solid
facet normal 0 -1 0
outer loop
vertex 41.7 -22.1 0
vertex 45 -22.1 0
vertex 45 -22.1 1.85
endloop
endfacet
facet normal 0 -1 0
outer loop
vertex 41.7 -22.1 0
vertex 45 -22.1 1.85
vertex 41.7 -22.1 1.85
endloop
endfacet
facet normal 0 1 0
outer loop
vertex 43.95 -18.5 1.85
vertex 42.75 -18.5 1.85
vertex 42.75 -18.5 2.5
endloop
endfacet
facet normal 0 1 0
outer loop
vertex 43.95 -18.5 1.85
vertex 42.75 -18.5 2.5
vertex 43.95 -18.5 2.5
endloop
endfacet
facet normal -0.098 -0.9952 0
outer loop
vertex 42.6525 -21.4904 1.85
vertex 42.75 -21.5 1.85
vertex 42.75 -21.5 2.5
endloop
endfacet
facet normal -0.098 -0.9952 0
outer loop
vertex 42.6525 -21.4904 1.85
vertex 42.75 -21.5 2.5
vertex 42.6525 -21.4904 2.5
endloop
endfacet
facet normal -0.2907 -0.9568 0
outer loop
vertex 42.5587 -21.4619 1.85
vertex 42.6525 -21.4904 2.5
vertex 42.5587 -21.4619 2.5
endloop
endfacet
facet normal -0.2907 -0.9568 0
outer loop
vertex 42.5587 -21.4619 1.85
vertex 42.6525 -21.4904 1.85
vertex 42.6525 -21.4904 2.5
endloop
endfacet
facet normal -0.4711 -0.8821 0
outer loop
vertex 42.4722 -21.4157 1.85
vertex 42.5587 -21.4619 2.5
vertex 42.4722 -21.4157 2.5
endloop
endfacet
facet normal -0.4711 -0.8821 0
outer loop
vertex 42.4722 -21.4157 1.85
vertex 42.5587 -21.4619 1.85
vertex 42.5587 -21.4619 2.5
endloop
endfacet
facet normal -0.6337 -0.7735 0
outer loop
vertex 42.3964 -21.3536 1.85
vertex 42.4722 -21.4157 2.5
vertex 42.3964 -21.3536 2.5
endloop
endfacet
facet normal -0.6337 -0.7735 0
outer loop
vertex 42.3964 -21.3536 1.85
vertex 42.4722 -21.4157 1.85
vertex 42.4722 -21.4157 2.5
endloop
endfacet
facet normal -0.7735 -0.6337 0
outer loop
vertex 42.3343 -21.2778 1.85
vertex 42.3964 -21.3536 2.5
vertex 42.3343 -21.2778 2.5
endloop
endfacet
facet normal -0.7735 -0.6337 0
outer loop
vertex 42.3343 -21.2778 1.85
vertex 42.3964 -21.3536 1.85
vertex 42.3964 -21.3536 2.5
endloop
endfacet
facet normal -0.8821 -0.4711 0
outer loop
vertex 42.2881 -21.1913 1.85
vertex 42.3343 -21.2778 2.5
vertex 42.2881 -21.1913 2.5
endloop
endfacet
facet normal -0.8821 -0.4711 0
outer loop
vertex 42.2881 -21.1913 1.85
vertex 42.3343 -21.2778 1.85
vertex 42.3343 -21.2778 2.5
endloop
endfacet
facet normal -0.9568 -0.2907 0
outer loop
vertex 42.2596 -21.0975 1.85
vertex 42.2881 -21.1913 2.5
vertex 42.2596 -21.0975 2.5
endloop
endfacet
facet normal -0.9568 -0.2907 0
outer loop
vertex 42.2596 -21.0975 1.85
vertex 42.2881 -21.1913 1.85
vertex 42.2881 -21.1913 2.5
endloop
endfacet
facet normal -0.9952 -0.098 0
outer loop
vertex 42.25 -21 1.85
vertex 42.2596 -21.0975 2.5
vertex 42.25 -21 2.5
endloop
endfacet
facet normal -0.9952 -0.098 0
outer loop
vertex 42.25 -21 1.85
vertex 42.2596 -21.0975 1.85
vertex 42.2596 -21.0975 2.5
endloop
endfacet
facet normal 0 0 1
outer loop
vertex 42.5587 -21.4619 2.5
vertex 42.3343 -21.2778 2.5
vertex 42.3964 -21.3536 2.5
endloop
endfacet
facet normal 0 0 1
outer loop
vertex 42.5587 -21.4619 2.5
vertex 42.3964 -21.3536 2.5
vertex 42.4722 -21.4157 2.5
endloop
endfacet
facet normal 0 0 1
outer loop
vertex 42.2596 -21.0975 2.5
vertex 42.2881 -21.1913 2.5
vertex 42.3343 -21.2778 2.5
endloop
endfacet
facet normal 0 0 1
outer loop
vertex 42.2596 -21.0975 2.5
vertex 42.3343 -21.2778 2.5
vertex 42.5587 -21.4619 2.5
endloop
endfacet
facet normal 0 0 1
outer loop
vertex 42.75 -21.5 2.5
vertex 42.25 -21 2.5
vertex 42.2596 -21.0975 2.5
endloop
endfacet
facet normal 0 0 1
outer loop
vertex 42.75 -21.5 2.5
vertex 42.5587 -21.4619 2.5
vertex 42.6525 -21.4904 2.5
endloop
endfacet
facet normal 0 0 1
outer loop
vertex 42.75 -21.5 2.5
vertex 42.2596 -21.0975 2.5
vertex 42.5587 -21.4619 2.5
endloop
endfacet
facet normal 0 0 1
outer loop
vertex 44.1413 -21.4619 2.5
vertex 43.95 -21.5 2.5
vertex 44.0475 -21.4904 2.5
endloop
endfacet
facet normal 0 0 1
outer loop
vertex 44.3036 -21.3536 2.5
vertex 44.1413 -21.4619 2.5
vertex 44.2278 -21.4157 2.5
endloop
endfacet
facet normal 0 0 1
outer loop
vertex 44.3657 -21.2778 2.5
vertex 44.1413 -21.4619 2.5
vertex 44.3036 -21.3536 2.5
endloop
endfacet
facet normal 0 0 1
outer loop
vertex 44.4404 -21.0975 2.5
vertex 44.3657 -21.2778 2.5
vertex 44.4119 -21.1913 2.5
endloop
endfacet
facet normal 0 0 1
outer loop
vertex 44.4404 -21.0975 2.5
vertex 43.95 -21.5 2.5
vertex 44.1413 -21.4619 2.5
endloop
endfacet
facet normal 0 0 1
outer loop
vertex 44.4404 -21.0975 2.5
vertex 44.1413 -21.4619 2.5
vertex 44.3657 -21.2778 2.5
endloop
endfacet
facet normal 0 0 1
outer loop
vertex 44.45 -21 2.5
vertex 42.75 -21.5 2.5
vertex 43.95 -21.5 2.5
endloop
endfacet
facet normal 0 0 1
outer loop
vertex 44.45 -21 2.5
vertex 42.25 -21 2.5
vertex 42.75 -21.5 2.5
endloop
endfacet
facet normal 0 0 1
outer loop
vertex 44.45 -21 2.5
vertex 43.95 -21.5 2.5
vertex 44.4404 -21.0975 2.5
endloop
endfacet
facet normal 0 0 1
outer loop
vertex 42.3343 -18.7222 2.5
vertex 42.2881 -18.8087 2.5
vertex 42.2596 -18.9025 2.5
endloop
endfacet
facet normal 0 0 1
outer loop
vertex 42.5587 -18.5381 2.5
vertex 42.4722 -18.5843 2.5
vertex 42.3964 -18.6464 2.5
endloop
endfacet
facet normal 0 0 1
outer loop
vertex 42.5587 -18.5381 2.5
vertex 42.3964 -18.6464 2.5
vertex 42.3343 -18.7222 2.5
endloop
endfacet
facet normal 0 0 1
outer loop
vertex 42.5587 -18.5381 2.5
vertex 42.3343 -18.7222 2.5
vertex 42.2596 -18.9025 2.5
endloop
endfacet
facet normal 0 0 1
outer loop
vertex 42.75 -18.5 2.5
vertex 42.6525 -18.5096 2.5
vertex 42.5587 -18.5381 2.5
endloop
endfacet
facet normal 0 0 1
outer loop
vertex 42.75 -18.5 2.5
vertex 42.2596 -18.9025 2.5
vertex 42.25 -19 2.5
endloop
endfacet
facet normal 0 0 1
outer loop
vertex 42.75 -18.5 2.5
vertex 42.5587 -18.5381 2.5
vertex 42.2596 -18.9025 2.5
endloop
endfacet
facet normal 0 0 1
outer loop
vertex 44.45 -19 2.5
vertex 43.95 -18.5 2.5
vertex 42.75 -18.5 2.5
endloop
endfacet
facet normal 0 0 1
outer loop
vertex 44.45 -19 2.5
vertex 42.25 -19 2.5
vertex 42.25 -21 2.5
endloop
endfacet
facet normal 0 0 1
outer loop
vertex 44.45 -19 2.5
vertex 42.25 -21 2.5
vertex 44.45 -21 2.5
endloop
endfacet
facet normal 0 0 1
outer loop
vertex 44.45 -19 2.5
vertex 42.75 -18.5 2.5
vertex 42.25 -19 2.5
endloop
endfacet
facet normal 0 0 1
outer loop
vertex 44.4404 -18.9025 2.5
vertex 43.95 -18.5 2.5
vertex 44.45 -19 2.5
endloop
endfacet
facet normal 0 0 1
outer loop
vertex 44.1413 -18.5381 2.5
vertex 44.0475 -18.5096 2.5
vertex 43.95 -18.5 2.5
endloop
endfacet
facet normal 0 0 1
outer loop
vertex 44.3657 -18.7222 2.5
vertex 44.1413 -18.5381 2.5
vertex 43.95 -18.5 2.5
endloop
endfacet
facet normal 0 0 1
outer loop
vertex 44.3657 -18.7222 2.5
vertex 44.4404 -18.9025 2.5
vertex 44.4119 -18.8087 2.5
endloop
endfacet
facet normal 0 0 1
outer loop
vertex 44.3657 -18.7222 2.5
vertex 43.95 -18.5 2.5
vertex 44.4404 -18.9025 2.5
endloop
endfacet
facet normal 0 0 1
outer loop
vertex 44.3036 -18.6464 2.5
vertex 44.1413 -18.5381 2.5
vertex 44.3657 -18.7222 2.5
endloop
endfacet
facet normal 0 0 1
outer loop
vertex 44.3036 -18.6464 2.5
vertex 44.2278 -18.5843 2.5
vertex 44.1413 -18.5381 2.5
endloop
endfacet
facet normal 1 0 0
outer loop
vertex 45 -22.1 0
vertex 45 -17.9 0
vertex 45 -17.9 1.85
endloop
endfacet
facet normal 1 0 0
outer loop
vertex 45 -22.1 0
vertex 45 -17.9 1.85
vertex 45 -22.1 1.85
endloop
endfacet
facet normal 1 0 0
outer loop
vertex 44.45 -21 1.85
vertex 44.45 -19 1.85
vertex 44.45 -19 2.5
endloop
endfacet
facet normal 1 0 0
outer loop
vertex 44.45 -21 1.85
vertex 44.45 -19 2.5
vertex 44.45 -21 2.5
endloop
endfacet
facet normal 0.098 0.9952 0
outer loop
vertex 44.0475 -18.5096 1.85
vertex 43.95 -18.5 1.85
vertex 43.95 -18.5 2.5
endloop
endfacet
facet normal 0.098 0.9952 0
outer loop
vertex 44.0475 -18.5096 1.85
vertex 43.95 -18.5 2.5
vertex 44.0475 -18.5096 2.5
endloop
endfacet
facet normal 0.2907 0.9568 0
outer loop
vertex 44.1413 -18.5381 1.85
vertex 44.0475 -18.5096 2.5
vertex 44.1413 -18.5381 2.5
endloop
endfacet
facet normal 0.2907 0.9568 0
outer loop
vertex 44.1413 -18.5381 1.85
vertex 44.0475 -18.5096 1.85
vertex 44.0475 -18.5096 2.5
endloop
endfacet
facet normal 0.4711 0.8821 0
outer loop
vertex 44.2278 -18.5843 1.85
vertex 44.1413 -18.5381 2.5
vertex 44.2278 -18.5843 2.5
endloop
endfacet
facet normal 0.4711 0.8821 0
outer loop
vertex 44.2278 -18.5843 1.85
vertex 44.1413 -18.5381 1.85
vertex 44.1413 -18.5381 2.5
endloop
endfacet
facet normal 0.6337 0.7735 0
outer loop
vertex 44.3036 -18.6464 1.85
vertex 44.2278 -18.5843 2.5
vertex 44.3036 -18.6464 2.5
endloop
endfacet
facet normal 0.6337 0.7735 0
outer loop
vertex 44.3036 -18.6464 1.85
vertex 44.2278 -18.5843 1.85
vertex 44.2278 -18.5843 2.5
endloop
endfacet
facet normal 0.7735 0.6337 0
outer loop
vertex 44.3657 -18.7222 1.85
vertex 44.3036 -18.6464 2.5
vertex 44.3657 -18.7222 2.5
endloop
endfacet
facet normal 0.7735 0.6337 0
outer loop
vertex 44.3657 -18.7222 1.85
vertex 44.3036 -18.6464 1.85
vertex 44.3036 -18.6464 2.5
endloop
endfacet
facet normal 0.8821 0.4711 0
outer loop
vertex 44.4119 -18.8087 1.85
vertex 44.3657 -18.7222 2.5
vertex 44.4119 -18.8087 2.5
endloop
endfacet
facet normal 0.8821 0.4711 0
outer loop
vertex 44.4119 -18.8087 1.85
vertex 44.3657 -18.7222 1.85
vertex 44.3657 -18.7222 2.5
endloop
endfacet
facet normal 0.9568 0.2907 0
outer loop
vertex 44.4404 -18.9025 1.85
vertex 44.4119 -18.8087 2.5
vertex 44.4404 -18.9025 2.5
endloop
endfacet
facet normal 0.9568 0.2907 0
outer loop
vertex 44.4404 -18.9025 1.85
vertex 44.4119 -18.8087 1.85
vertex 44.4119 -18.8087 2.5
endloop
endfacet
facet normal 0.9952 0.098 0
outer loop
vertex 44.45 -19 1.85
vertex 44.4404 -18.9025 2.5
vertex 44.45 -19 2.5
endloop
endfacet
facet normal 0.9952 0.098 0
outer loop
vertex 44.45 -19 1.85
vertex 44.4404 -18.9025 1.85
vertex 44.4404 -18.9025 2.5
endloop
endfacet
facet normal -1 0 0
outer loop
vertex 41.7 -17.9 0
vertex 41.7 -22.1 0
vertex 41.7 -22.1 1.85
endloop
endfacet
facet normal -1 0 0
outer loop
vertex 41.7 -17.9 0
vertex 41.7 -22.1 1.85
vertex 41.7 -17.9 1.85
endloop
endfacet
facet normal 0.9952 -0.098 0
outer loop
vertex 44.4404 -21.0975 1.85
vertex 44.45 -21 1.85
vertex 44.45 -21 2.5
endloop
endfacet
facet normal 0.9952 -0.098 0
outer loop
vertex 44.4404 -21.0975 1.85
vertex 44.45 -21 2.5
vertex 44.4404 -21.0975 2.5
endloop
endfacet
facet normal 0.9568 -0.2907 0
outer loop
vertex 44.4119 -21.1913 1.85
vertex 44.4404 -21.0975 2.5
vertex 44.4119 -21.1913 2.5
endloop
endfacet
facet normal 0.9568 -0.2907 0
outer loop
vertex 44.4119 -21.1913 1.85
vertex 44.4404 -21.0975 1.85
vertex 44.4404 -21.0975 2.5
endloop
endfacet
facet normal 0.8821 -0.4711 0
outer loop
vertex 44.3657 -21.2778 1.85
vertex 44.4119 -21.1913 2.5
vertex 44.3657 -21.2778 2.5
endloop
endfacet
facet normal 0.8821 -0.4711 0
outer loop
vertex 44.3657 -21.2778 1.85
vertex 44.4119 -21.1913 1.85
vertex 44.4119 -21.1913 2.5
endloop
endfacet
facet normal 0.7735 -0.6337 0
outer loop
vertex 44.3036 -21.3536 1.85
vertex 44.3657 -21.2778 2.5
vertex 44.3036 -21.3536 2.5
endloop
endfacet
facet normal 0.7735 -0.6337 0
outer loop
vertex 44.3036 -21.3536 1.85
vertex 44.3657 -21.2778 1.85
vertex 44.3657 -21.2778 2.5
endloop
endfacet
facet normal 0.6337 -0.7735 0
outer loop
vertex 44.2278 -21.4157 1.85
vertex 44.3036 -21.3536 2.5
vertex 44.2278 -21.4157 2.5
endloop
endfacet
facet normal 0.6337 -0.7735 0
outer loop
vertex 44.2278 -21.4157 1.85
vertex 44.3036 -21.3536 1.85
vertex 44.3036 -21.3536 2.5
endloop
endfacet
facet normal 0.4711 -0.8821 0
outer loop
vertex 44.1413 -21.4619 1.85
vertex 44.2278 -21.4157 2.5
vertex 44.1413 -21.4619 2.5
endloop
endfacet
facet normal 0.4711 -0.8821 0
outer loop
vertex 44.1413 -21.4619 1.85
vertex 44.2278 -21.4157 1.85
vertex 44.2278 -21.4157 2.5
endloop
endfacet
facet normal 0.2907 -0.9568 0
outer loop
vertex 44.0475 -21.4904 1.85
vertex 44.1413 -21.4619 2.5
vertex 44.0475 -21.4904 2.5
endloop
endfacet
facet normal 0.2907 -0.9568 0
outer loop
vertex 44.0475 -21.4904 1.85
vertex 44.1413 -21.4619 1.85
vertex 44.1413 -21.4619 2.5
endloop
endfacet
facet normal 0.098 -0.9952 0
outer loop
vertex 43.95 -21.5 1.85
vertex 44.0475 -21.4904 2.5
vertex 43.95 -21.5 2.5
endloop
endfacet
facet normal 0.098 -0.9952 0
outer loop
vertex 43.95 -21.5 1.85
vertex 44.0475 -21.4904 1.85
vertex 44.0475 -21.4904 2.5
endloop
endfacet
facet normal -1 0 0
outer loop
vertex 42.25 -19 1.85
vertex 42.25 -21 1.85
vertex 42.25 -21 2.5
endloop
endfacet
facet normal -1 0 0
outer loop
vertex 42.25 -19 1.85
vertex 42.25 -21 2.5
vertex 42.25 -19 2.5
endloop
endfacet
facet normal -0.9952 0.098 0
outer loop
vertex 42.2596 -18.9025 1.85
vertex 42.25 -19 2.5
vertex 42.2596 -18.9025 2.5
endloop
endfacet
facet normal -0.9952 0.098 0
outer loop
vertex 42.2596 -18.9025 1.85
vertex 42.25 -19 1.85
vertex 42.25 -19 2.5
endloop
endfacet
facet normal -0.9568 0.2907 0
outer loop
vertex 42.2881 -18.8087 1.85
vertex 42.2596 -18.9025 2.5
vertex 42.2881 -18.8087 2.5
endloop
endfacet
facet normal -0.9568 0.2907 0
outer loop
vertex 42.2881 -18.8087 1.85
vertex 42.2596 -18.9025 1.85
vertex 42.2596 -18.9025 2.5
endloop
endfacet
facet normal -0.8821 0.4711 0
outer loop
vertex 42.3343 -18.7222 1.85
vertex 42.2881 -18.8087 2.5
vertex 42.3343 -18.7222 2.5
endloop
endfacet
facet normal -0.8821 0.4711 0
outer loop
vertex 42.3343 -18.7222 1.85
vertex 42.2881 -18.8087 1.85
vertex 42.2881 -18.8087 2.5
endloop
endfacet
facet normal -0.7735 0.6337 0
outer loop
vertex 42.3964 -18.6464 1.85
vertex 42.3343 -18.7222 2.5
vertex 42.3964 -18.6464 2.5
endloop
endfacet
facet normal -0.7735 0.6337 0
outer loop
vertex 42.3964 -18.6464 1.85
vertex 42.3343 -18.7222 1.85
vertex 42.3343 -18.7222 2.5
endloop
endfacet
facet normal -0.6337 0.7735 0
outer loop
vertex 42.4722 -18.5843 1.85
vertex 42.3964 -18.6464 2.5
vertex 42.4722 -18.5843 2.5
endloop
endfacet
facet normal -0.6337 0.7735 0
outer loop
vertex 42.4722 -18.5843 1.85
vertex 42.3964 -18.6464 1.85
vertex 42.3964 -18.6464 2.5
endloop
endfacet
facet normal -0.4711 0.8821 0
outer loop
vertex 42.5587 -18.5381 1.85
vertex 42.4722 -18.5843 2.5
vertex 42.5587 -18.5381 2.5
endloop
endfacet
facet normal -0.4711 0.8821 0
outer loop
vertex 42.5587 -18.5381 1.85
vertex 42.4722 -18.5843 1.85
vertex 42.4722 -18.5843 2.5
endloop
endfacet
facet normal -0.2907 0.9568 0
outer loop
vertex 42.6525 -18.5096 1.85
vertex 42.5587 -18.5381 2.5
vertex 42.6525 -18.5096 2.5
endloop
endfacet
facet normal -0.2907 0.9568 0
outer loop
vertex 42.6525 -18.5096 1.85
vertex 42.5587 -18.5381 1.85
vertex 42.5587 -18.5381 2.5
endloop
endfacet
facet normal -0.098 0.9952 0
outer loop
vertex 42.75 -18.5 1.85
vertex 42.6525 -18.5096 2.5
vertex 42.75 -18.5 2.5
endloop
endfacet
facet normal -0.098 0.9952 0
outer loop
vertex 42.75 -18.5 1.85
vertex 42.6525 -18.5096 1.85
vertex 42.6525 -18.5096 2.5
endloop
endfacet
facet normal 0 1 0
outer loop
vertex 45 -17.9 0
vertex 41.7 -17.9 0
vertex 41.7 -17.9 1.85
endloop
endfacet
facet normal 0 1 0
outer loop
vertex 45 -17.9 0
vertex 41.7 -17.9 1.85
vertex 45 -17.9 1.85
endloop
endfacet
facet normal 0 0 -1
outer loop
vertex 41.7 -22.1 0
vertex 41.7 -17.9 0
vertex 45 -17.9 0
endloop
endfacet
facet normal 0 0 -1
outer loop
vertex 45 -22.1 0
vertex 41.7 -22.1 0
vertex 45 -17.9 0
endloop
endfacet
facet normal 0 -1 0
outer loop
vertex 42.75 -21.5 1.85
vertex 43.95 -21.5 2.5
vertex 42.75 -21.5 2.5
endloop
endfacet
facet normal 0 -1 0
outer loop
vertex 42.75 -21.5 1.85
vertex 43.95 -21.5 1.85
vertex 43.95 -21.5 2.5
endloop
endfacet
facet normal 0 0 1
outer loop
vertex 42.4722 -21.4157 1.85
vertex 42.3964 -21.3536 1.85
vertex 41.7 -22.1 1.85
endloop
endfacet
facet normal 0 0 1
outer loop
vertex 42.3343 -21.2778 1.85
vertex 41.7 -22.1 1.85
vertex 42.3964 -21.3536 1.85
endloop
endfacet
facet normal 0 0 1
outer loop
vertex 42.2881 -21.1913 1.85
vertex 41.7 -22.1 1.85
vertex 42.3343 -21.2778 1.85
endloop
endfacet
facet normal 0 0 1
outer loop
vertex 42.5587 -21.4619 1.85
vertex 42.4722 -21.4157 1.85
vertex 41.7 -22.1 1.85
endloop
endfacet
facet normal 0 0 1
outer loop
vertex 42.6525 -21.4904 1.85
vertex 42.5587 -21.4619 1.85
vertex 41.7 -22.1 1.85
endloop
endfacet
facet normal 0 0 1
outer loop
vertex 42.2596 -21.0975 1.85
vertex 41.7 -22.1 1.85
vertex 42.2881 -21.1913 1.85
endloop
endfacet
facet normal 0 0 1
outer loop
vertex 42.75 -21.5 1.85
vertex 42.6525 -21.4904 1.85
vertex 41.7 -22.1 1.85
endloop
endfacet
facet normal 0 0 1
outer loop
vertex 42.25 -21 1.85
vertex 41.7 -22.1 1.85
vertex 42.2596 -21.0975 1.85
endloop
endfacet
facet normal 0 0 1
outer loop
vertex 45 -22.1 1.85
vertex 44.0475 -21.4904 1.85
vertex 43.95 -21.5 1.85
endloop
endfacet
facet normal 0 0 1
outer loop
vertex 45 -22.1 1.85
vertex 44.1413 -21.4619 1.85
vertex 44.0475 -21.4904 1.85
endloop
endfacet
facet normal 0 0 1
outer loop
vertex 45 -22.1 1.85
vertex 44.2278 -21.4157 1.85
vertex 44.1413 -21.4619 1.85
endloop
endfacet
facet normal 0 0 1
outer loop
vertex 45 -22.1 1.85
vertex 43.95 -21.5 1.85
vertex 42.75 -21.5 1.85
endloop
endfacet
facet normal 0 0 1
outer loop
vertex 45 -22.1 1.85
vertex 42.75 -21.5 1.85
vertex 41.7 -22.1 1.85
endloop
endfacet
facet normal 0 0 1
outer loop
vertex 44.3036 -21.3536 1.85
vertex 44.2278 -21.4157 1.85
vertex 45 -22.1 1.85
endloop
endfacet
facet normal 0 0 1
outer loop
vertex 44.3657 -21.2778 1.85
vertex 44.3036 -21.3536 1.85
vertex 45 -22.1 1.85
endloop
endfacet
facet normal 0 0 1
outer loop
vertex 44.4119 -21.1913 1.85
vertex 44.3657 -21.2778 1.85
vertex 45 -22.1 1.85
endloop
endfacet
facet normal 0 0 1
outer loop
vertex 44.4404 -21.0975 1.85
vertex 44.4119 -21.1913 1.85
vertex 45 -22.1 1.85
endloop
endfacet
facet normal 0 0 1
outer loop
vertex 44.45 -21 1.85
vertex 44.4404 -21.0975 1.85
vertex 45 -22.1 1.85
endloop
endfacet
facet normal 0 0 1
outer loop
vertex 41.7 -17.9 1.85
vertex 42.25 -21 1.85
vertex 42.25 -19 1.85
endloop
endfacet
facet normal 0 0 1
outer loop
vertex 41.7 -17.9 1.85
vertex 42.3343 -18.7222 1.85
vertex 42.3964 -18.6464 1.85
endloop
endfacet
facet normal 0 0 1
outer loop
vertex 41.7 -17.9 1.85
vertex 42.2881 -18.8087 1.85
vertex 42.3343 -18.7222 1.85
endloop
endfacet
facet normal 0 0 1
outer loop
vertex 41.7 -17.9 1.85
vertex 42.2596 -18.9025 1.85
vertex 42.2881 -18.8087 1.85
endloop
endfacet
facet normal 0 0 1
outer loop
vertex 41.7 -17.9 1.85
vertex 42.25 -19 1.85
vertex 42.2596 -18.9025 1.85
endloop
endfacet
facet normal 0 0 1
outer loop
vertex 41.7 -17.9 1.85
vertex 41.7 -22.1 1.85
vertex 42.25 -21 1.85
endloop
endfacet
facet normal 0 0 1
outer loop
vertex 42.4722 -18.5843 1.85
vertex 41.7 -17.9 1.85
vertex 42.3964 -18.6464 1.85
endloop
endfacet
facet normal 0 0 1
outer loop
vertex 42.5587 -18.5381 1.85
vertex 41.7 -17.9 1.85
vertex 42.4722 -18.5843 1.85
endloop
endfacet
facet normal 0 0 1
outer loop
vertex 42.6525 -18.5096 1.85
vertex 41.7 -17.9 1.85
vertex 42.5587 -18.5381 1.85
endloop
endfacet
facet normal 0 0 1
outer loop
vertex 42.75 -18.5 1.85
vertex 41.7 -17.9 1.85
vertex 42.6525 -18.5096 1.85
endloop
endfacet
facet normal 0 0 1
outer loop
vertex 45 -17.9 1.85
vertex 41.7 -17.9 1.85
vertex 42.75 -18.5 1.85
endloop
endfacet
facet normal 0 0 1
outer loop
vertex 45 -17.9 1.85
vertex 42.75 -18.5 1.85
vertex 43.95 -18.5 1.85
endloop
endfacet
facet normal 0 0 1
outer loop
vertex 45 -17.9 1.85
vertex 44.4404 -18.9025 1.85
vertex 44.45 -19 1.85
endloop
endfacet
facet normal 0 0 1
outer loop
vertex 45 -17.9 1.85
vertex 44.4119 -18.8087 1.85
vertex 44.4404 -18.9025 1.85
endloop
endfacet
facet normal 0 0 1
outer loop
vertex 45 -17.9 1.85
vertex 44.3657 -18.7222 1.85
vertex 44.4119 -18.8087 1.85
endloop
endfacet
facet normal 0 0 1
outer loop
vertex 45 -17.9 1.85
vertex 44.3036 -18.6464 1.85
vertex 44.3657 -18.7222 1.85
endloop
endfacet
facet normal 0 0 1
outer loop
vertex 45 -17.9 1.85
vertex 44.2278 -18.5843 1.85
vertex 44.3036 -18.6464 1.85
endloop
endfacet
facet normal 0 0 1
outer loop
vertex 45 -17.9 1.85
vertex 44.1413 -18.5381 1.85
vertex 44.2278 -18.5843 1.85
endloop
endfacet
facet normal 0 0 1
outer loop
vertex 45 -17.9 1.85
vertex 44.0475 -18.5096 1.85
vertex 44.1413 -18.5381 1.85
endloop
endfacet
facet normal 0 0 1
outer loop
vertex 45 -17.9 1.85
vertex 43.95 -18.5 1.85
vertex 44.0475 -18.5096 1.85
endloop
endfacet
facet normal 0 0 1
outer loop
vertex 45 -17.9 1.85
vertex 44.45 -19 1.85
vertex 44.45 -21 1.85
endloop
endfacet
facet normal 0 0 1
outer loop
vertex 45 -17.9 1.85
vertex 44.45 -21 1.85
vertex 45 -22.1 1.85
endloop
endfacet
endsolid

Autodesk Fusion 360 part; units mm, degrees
sketch "Sketch1" plane through (0, 0, 0) normal (0, 0, 1) x (1, 0, 0)
  line L0 (41.7, -17.9) -> (45, -17.9)
  line L1 (45, -17.9) -> (45, -22.1)
  line L2 (45, -22.1) -> (41.7, -22.1)
  line L3 (41.7, -22.1) -> (41.7, -17.9)
  line L4 (42.75, -18.5) -> (43.95, -18.5)
  line L5 (44.45, -19) -> (44.45, -21)
  line L6 (43.95, -21.5) -> (42.75, -21.5)
  line L7 (42.25, -21) -> (42.25, -19)
  arc A0 (44.45, -19) -> (43.95, -18.5) centre (43.95, -19) ccw
  arc A1 (43.95, -21.5) -> (44.45, -21) centre (43.95, -21) ccw
  arc A2 (42.25, -21) -> (42.75, -21.5) centre (42.75, -21) ccw
  arc A3 (42.75, -18.5) -> (42.25, -19) centre (42.75, -19) ccw
  line L8 (43.35, -18.5) -> (43.35, -21.5) construction
  line L9 (42.25, -20) -> (44.45, -20) construction
  line L10 (41.7, -20) -> (45, -20) construction
  line L11 (43.35, -17.9) -> (43.35, -22.1) construction
  point P0 (43.35, -20)
  dimension "d365" = 4.2
  dimension "d366" = 3.3
  dimension "d367" = 3
  dimension "d368" = 2.2
  dimension "d369" = 0.5
extrude "Extrude1" add sketch "Sketch1" along normal blind 1.85
extrude "Extrude2" add sketch "Sketch1" along normal blind 2.5 contours L4 L5 L6 L7 A0 A1 A2 A3
